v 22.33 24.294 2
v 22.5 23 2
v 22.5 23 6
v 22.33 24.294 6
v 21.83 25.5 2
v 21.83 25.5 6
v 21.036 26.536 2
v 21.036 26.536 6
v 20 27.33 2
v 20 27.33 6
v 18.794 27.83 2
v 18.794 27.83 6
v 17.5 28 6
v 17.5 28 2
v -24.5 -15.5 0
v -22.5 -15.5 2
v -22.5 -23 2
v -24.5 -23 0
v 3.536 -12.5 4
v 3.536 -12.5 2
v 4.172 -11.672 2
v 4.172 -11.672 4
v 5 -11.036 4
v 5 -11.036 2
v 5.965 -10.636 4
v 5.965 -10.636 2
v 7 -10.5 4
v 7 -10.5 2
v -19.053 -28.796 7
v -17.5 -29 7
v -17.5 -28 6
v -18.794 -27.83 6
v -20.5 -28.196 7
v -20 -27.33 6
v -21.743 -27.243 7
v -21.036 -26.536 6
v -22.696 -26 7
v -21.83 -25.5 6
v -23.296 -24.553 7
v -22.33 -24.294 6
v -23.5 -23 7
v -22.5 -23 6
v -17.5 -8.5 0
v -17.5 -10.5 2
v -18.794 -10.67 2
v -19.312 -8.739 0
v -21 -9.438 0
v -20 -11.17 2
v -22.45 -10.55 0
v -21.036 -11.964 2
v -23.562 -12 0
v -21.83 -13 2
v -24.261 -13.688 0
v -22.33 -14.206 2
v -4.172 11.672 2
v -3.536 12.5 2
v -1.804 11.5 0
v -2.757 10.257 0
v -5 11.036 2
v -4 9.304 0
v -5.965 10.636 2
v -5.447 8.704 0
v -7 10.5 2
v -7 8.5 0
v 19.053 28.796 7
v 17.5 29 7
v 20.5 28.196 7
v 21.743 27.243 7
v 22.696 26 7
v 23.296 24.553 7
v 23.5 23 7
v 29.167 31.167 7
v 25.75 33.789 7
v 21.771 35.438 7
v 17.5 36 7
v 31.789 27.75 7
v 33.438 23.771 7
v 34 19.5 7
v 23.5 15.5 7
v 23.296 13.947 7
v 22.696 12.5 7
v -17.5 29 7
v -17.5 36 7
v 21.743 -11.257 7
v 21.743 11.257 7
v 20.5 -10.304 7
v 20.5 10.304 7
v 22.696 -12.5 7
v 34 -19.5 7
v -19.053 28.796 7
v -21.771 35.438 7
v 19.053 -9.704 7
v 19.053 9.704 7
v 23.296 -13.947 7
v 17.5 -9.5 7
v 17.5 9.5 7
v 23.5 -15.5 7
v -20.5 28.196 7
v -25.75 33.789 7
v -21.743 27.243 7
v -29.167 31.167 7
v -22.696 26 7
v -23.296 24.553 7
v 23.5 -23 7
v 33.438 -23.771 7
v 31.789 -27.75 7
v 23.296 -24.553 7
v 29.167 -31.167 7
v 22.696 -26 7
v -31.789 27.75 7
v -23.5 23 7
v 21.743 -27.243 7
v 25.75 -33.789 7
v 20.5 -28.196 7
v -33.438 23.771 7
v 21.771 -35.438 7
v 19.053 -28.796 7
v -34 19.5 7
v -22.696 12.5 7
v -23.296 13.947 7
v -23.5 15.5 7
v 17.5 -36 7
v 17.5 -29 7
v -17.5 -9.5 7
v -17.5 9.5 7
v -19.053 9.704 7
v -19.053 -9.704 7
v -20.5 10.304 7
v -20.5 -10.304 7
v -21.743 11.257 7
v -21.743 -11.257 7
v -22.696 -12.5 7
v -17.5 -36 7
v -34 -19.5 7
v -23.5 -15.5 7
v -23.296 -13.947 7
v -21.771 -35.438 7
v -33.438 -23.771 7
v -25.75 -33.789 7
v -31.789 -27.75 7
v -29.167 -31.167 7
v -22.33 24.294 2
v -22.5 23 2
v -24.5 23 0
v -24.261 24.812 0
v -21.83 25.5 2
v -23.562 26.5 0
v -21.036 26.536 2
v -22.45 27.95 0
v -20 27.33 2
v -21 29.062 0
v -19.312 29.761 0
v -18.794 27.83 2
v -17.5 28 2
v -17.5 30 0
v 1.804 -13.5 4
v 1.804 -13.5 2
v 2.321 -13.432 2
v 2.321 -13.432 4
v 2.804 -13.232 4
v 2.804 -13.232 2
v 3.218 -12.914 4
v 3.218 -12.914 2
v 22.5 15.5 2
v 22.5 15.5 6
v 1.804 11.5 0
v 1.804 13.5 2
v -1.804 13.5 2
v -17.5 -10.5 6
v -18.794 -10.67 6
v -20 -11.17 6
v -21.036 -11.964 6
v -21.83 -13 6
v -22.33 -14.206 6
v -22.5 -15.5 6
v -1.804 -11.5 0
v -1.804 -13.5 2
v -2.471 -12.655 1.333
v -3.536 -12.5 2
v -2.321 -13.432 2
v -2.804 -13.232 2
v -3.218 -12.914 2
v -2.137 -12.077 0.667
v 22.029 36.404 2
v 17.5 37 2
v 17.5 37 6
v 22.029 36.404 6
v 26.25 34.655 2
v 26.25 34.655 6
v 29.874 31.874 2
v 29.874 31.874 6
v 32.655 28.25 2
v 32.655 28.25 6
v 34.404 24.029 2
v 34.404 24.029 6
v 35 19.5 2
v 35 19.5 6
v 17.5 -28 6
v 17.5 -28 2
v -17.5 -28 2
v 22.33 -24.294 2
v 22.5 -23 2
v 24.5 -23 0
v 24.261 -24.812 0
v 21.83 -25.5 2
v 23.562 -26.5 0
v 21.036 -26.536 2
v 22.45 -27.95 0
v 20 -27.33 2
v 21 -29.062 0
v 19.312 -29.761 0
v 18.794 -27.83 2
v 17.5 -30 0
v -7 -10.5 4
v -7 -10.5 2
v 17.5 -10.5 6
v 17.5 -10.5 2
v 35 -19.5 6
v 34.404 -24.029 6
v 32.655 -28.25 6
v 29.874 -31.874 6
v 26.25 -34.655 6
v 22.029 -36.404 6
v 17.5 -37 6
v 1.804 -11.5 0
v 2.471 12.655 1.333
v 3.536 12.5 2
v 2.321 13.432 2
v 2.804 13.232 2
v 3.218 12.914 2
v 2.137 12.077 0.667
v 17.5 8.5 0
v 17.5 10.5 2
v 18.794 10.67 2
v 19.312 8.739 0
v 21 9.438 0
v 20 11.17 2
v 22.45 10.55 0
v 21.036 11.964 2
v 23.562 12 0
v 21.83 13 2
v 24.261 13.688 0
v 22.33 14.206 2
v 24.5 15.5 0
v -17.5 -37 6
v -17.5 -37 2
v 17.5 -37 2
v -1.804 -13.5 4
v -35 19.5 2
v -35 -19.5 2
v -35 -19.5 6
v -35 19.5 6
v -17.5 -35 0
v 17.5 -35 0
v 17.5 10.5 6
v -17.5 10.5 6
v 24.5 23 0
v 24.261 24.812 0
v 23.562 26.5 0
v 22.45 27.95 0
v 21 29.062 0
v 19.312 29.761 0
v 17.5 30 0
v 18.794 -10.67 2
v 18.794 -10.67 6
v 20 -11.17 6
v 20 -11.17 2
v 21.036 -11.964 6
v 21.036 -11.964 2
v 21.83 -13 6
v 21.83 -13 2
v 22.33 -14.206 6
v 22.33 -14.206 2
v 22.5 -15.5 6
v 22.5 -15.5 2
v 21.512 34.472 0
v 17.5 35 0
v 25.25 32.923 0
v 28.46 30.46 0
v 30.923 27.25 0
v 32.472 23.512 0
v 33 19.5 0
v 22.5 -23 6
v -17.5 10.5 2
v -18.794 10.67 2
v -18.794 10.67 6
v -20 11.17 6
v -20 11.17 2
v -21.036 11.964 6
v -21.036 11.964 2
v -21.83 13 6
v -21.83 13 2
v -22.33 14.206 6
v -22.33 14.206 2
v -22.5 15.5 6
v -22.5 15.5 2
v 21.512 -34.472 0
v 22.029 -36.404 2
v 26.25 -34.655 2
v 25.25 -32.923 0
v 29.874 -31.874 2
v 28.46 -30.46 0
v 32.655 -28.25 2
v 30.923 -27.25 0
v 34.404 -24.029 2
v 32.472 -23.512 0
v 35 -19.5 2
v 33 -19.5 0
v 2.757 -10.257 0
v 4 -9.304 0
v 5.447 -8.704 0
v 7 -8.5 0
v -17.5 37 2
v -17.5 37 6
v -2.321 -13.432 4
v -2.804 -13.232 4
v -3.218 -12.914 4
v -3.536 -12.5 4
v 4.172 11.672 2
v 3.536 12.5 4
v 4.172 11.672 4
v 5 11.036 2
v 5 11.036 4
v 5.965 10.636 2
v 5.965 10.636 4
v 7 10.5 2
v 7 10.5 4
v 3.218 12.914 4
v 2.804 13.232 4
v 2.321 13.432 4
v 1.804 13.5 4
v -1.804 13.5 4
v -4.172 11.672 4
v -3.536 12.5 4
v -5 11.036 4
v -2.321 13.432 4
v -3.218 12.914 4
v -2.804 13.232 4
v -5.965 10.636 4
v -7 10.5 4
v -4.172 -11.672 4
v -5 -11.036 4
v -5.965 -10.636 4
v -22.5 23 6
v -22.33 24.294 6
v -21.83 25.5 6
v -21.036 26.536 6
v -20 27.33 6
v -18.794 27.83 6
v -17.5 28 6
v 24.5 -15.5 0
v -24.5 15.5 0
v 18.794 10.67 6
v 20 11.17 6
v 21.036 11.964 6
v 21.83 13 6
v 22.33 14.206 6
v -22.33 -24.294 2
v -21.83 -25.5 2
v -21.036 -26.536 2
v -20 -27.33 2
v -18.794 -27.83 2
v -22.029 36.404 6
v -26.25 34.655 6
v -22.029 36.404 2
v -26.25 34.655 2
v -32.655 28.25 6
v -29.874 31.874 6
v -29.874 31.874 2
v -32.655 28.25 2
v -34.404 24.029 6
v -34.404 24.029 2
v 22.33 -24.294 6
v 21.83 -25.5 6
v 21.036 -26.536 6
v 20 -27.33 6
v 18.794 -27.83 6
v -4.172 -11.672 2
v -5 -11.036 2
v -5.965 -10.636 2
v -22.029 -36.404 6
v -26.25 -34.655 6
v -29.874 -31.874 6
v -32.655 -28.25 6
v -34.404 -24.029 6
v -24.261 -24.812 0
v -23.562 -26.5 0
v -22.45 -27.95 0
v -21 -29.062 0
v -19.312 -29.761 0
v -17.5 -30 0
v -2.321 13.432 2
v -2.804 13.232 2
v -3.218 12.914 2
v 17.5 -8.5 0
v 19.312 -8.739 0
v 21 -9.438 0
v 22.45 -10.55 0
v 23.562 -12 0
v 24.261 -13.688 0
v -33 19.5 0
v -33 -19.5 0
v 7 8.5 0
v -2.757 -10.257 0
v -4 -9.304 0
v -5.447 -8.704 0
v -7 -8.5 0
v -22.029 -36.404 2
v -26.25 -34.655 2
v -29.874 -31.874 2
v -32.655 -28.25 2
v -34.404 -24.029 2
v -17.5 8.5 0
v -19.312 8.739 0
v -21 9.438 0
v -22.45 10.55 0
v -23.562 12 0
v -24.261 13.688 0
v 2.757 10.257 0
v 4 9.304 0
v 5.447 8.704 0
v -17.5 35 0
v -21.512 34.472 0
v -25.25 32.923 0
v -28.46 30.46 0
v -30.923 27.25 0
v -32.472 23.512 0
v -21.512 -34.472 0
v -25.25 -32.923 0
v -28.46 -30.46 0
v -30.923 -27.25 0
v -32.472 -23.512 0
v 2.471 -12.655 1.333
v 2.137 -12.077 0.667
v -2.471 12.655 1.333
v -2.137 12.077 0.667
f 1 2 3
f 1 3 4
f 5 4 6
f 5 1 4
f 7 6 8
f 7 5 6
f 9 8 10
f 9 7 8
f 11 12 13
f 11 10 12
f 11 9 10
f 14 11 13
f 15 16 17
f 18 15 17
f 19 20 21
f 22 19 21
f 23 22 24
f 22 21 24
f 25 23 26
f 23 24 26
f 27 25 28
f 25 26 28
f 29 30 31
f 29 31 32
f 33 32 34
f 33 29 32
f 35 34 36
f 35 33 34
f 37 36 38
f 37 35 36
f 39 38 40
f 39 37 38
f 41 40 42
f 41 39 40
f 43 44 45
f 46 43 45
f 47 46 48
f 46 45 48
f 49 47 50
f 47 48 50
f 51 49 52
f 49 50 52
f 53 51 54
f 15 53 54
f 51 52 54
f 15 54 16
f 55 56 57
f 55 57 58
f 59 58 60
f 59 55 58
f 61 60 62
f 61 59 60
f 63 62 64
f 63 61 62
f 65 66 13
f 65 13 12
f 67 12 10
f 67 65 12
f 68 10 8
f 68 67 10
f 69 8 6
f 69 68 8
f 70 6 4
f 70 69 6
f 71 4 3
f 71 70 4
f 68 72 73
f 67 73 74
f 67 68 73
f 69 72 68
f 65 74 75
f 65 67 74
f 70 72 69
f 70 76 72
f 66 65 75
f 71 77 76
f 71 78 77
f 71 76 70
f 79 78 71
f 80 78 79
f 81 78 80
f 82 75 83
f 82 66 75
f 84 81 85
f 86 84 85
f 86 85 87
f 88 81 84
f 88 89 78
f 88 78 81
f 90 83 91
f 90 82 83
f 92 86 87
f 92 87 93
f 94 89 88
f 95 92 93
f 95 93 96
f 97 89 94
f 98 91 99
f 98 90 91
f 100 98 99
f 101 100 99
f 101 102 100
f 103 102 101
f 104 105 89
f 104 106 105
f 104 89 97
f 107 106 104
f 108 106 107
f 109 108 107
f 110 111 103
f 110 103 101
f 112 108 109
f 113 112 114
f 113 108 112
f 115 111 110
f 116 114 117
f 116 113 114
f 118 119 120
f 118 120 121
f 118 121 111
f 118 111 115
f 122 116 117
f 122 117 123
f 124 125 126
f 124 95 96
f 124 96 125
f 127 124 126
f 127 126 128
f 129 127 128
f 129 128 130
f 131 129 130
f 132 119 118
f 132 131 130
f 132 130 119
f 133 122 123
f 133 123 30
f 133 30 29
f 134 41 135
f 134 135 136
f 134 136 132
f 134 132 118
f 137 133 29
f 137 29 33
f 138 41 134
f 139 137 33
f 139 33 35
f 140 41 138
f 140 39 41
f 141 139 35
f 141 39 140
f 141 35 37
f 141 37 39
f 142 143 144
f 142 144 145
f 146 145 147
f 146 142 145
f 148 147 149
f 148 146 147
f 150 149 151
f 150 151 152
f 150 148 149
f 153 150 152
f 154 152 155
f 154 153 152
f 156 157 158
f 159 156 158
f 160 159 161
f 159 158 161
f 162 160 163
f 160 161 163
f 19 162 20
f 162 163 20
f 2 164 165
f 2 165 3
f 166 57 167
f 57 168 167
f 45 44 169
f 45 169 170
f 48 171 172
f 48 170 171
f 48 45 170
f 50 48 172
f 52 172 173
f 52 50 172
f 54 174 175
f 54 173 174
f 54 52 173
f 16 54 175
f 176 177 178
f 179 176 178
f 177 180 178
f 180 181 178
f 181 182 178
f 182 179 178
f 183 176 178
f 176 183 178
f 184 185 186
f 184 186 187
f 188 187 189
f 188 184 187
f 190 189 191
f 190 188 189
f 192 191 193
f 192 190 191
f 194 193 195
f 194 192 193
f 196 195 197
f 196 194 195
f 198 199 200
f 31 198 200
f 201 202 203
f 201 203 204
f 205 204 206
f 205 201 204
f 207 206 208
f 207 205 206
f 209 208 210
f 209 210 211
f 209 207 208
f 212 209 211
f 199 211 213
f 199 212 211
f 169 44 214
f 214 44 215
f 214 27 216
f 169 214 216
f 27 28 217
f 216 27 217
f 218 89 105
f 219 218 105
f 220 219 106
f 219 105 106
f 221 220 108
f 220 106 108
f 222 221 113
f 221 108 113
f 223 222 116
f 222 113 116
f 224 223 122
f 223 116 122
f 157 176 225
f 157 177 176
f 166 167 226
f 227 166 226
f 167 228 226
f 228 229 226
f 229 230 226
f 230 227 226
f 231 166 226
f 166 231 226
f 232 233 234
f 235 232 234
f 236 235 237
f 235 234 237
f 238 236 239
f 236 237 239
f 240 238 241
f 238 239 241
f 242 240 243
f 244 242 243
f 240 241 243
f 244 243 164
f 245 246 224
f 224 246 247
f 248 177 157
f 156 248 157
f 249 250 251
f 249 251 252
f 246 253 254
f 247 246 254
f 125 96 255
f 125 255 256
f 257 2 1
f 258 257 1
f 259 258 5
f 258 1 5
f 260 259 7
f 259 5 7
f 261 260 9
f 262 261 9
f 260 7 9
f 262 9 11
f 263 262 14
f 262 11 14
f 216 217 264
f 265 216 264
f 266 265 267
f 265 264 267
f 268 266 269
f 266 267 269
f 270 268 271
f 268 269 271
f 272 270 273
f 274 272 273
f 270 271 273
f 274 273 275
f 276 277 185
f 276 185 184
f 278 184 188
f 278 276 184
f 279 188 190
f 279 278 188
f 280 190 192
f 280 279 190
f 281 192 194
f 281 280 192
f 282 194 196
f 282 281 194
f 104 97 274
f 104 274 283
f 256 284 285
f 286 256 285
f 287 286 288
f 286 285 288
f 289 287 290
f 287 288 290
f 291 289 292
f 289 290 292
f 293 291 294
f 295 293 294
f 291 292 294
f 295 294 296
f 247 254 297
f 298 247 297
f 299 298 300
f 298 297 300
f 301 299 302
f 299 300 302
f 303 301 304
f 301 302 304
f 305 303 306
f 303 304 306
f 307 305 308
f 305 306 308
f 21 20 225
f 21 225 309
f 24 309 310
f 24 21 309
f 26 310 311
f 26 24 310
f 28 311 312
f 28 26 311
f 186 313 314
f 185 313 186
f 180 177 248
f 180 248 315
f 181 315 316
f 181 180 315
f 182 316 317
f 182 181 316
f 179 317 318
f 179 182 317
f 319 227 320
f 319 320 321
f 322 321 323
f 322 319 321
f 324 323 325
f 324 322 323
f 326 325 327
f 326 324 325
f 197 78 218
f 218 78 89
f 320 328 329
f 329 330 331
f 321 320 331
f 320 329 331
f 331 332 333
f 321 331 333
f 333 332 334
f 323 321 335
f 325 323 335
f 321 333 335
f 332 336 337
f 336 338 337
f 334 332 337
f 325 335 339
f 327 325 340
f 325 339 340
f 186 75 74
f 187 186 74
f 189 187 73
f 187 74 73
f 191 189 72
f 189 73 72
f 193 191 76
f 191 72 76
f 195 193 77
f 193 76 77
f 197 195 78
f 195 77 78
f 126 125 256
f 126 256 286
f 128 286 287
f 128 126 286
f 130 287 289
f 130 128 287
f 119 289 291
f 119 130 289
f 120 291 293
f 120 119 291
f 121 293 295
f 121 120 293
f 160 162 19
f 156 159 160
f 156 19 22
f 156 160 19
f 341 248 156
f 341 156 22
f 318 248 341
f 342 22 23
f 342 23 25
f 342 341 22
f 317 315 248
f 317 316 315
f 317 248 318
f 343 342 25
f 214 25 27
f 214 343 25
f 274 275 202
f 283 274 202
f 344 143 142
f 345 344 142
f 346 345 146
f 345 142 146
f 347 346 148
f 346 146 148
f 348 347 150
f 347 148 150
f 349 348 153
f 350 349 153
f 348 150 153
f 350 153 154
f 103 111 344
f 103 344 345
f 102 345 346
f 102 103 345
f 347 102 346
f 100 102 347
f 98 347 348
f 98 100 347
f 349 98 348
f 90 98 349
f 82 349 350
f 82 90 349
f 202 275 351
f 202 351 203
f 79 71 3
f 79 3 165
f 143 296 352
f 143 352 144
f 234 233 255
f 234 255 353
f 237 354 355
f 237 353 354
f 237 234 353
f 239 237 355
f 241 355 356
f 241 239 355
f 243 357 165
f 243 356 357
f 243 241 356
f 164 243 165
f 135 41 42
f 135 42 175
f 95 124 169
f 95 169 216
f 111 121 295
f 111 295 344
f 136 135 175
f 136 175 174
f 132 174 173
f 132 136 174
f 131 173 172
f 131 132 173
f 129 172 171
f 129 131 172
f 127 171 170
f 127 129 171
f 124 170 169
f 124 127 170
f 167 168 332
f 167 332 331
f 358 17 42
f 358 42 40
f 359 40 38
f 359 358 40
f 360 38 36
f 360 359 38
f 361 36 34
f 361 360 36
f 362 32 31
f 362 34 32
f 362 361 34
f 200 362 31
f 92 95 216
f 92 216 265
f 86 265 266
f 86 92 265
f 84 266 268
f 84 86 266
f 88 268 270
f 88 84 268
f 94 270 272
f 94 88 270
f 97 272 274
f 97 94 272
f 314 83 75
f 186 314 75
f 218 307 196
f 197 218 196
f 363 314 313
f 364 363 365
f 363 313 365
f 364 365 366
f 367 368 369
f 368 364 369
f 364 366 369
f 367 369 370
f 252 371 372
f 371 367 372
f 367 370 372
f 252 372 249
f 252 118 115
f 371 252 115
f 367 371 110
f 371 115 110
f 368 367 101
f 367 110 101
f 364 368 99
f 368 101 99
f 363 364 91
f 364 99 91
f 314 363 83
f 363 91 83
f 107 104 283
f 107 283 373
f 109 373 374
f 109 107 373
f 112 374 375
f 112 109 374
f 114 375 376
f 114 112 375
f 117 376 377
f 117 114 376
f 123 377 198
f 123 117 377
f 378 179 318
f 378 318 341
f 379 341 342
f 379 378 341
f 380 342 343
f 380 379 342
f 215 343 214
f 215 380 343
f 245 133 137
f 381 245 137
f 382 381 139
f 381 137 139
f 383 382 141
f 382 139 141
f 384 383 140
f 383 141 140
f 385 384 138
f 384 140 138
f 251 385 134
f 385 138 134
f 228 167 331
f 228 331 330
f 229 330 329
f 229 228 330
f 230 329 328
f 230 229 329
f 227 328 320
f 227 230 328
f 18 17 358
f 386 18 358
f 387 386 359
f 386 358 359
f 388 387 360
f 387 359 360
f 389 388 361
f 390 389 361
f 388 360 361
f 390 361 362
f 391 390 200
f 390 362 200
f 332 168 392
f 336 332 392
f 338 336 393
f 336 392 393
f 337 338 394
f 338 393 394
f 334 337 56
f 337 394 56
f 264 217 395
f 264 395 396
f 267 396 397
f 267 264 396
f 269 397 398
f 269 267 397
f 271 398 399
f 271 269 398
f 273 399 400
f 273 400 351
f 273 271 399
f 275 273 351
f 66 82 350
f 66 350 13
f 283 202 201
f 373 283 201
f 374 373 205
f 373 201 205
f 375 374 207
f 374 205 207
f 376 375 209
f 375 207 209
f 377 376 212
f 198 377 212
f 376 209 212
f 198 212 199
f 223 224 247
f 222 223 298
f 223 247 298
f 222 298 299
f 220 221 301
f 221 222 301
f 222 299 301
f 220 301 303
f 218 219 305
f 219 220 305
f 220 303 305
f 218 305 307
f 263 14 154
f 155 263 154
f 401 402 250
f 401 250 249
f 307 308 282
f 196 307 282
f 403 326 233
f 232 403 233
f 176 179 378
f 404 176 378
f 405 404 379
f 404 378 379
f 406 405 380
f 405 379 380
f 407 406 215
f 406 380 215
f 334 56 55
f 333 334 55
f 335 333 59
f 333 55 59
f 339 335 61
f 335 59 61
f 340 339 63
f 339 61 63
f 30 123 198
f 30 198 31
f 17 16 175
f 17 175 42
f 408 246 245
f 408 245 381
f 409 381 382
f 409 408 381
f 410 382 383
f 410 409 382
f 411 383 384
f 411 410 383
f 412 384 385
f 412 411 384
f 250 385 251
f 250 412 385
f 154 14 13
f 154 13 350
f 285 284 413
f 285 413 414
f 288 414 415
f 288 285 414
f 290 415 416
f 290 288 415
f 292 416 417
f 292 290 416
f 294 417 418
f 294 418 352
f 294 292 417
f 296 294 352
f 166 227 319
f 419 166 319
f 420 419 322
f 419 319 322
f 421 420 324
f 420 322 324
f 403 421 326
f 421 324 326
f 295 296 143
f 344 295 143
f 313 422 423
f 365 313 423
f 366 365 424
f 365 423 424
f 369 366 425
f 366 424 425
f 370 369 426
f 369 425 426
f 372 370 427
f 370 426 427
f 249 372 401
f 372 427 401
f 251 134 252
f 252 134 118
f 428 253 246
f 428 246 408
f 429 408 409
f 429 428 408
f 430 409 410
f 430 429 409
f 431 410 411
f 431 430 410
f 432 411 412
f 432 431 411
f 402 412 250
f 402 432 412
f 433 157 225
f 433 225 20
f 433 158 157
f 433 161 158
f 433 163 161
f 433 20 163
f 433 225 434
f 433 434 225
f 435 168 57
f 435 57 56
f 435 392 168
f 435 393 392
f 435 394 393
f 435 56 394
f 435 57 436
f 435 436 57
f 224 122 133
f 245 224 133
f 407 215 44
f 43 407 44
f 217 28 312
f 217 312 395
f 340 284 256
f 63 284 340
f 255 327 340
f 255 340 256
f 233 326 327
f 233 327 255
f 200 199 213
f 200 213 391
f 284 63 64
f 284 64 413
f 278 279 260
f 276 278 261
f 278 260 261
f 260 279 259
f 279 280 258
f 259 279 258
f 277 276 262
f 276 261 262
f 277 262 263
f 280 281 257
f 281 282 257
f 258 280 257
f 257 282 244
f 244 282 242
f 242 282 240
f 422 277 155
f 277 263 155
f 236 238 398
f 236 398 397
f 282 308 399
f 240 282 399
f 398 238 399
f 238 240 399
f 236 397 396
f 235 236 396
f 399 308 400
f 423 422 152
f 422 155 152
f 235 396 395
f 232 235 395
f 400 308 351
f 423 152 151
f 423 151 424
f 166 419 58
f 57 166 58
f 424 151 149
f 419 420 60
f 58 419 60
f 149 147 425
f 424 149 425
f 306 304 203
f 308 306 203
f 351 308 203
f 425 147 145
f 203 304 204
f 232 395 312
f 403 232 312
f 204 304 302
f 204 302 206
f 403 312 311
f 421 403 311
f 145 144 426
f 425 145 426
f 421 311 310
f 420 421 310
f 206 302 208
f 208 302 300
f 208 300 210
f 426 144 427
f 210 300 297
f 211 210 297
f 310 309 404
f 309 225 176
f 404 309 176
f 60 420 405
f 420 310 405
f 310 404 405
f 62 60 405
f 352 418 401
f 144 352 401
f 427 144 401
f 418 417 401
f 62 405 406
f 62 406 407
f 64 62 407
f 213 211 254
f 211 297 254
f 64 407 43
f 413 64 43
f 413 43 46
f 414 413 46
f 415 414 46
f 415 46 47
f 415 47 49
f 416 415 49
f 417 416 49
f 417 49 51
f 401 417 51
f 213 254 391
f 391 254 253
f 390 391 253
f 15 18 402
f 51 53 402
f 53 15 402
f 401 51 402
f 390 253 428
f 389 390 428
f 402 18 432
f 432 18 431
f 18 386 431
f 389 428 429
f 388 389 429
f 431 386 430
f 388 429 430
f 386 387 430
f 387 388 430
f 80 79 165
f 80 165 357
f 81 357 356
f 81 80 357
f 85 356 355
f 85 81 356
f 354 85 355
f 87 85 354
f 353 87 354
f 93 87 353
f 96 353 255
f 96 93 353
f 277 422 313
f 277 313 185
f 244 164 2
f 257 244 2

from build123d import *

# Parameters (mm, degrees)
F1_DEPTH = 7
F3_DEPTH = 4
F4_SIZE  = 1.99999
F8_SIZE  = 1


# Not quite as in the source:
# - a fillet or chamfer is up to 0.001 mm smaller than in the source, because OpenCascade refuses the exact size


with BuildPart() as f1:
    # F0 (on Top) → F1 (new body)
    with BuildSketch(Plane.XY):
        with BuildLine():
            Line((0, 10.5), (-17.5, 10.5))
            ThreePointArc((-17.5, 10.5), (-21.0355339059, 11.9644660941), (-22.5, 15.5))
            Line((-22.5, 15.5), (-22.5, 23))
            ThreePointArc((-22.5, 23), (-21.0355339059, 26.5355339059), (-17.5, 28))
            Line((-17.5, 28), (0, 28))
            Line((0, 28), (0, 37))
            Line((0, 37), (-17.5, 37))
            ThreePointArc((-17.5, 37), (-29.8743686708, 31.8743686708), (-35, 19.5))
            Line((-35, 19.5), (-35, 0))
            Line((-35, 0), (0, 0))
            Line((0, 0), (0, 10.5))
        make_face()
    extrude(amount=F1_DEPTH)

    # F2 (on Top) → F3 (join)
    with BuildSketch(Plane.XY):
        with BuildLine():
            Line((-7, 10.5), (0, 10.5))
            Line((0, 10.5), (0, 13.5))
            Line((0, 13.5), (-1.8038475773, 13.5))
            ThreePointArc((-1.8038475773, 13.5), (-2.8038475773, 13.2320508076), (-3.5358983849, 12.5))
            ThreePointArc((-3.5358983849, 12.5), (-5, 11.0358983849), (-7, 10.5))
        make_face()
    extrude(amount=F3_DEPTH)

    # F4 (size 2 in the source; OpenCascade refuses exactly that, so slightly less here)
    f4_edges = [f1.edges().sort_by_distance(p)[0] for p in [
        (-0.901924, 13.5, 0),
        (-35, 9.75, 0),
    ]]
    chamfer(f4_edges, length=F4_SIZE)

    # F6: F1 across face


with BuildPart() as f1_1:
    add(f1.part)
    add(f1.part.mirror(Plane(origin=(0, 6.0384247014, 3.3522948458), x_dir=(0, 1, 0), z_dir=(1, 0, 0))))

    # F7: F1 across face


with BuildPart() as f1_2:
    add(f1_1.part)
    add(f1_1.part.mirror(Plane(origin=(0, 0, 3.5233194082), x_dir=(1, 0, 0), z_dir=(0, -1, 0))))

    # F8
    f8_edges = [f1_2.edges().sort_by_distance(p)[0] for p in [
        (29.874369, 31.874369, 7),
        (0, 37, 7),
        (-29.874369, 31.874369, 7),
        (-35, 0, 7),
        (-29.874369, -31.874369, 7),
        (0, -37, 7),
        (29.874369, -31.874369, 7),
        (35, 0, 7),
        (-21.035534, 11.964466, 7),
        (-22.5, 19.25, 7),
        (-21.035534, 26.535534, 7),
        (0, 28, 7),
        (21.035534, 26.535534, 7),
        (22.5, 19.25, 7),
        (21.035534, 11.964466, 7),
        (0, 10.5, 7),
        (0, -10.5, 7),
        (21.035534, -11.964466, 7),
        (22.5, -19.25, 7),
        (21.035534, -26.535534, 7),
        (0, -28, 7),
        (-21.035534, -26.535534, 7),
        (-22.5, -19.25, 7),
        (-21.035534, -11.964466, 7),
    ]]
    chamfer(f8_edges, length=F8_SIZE)


solid = f1_2.part
